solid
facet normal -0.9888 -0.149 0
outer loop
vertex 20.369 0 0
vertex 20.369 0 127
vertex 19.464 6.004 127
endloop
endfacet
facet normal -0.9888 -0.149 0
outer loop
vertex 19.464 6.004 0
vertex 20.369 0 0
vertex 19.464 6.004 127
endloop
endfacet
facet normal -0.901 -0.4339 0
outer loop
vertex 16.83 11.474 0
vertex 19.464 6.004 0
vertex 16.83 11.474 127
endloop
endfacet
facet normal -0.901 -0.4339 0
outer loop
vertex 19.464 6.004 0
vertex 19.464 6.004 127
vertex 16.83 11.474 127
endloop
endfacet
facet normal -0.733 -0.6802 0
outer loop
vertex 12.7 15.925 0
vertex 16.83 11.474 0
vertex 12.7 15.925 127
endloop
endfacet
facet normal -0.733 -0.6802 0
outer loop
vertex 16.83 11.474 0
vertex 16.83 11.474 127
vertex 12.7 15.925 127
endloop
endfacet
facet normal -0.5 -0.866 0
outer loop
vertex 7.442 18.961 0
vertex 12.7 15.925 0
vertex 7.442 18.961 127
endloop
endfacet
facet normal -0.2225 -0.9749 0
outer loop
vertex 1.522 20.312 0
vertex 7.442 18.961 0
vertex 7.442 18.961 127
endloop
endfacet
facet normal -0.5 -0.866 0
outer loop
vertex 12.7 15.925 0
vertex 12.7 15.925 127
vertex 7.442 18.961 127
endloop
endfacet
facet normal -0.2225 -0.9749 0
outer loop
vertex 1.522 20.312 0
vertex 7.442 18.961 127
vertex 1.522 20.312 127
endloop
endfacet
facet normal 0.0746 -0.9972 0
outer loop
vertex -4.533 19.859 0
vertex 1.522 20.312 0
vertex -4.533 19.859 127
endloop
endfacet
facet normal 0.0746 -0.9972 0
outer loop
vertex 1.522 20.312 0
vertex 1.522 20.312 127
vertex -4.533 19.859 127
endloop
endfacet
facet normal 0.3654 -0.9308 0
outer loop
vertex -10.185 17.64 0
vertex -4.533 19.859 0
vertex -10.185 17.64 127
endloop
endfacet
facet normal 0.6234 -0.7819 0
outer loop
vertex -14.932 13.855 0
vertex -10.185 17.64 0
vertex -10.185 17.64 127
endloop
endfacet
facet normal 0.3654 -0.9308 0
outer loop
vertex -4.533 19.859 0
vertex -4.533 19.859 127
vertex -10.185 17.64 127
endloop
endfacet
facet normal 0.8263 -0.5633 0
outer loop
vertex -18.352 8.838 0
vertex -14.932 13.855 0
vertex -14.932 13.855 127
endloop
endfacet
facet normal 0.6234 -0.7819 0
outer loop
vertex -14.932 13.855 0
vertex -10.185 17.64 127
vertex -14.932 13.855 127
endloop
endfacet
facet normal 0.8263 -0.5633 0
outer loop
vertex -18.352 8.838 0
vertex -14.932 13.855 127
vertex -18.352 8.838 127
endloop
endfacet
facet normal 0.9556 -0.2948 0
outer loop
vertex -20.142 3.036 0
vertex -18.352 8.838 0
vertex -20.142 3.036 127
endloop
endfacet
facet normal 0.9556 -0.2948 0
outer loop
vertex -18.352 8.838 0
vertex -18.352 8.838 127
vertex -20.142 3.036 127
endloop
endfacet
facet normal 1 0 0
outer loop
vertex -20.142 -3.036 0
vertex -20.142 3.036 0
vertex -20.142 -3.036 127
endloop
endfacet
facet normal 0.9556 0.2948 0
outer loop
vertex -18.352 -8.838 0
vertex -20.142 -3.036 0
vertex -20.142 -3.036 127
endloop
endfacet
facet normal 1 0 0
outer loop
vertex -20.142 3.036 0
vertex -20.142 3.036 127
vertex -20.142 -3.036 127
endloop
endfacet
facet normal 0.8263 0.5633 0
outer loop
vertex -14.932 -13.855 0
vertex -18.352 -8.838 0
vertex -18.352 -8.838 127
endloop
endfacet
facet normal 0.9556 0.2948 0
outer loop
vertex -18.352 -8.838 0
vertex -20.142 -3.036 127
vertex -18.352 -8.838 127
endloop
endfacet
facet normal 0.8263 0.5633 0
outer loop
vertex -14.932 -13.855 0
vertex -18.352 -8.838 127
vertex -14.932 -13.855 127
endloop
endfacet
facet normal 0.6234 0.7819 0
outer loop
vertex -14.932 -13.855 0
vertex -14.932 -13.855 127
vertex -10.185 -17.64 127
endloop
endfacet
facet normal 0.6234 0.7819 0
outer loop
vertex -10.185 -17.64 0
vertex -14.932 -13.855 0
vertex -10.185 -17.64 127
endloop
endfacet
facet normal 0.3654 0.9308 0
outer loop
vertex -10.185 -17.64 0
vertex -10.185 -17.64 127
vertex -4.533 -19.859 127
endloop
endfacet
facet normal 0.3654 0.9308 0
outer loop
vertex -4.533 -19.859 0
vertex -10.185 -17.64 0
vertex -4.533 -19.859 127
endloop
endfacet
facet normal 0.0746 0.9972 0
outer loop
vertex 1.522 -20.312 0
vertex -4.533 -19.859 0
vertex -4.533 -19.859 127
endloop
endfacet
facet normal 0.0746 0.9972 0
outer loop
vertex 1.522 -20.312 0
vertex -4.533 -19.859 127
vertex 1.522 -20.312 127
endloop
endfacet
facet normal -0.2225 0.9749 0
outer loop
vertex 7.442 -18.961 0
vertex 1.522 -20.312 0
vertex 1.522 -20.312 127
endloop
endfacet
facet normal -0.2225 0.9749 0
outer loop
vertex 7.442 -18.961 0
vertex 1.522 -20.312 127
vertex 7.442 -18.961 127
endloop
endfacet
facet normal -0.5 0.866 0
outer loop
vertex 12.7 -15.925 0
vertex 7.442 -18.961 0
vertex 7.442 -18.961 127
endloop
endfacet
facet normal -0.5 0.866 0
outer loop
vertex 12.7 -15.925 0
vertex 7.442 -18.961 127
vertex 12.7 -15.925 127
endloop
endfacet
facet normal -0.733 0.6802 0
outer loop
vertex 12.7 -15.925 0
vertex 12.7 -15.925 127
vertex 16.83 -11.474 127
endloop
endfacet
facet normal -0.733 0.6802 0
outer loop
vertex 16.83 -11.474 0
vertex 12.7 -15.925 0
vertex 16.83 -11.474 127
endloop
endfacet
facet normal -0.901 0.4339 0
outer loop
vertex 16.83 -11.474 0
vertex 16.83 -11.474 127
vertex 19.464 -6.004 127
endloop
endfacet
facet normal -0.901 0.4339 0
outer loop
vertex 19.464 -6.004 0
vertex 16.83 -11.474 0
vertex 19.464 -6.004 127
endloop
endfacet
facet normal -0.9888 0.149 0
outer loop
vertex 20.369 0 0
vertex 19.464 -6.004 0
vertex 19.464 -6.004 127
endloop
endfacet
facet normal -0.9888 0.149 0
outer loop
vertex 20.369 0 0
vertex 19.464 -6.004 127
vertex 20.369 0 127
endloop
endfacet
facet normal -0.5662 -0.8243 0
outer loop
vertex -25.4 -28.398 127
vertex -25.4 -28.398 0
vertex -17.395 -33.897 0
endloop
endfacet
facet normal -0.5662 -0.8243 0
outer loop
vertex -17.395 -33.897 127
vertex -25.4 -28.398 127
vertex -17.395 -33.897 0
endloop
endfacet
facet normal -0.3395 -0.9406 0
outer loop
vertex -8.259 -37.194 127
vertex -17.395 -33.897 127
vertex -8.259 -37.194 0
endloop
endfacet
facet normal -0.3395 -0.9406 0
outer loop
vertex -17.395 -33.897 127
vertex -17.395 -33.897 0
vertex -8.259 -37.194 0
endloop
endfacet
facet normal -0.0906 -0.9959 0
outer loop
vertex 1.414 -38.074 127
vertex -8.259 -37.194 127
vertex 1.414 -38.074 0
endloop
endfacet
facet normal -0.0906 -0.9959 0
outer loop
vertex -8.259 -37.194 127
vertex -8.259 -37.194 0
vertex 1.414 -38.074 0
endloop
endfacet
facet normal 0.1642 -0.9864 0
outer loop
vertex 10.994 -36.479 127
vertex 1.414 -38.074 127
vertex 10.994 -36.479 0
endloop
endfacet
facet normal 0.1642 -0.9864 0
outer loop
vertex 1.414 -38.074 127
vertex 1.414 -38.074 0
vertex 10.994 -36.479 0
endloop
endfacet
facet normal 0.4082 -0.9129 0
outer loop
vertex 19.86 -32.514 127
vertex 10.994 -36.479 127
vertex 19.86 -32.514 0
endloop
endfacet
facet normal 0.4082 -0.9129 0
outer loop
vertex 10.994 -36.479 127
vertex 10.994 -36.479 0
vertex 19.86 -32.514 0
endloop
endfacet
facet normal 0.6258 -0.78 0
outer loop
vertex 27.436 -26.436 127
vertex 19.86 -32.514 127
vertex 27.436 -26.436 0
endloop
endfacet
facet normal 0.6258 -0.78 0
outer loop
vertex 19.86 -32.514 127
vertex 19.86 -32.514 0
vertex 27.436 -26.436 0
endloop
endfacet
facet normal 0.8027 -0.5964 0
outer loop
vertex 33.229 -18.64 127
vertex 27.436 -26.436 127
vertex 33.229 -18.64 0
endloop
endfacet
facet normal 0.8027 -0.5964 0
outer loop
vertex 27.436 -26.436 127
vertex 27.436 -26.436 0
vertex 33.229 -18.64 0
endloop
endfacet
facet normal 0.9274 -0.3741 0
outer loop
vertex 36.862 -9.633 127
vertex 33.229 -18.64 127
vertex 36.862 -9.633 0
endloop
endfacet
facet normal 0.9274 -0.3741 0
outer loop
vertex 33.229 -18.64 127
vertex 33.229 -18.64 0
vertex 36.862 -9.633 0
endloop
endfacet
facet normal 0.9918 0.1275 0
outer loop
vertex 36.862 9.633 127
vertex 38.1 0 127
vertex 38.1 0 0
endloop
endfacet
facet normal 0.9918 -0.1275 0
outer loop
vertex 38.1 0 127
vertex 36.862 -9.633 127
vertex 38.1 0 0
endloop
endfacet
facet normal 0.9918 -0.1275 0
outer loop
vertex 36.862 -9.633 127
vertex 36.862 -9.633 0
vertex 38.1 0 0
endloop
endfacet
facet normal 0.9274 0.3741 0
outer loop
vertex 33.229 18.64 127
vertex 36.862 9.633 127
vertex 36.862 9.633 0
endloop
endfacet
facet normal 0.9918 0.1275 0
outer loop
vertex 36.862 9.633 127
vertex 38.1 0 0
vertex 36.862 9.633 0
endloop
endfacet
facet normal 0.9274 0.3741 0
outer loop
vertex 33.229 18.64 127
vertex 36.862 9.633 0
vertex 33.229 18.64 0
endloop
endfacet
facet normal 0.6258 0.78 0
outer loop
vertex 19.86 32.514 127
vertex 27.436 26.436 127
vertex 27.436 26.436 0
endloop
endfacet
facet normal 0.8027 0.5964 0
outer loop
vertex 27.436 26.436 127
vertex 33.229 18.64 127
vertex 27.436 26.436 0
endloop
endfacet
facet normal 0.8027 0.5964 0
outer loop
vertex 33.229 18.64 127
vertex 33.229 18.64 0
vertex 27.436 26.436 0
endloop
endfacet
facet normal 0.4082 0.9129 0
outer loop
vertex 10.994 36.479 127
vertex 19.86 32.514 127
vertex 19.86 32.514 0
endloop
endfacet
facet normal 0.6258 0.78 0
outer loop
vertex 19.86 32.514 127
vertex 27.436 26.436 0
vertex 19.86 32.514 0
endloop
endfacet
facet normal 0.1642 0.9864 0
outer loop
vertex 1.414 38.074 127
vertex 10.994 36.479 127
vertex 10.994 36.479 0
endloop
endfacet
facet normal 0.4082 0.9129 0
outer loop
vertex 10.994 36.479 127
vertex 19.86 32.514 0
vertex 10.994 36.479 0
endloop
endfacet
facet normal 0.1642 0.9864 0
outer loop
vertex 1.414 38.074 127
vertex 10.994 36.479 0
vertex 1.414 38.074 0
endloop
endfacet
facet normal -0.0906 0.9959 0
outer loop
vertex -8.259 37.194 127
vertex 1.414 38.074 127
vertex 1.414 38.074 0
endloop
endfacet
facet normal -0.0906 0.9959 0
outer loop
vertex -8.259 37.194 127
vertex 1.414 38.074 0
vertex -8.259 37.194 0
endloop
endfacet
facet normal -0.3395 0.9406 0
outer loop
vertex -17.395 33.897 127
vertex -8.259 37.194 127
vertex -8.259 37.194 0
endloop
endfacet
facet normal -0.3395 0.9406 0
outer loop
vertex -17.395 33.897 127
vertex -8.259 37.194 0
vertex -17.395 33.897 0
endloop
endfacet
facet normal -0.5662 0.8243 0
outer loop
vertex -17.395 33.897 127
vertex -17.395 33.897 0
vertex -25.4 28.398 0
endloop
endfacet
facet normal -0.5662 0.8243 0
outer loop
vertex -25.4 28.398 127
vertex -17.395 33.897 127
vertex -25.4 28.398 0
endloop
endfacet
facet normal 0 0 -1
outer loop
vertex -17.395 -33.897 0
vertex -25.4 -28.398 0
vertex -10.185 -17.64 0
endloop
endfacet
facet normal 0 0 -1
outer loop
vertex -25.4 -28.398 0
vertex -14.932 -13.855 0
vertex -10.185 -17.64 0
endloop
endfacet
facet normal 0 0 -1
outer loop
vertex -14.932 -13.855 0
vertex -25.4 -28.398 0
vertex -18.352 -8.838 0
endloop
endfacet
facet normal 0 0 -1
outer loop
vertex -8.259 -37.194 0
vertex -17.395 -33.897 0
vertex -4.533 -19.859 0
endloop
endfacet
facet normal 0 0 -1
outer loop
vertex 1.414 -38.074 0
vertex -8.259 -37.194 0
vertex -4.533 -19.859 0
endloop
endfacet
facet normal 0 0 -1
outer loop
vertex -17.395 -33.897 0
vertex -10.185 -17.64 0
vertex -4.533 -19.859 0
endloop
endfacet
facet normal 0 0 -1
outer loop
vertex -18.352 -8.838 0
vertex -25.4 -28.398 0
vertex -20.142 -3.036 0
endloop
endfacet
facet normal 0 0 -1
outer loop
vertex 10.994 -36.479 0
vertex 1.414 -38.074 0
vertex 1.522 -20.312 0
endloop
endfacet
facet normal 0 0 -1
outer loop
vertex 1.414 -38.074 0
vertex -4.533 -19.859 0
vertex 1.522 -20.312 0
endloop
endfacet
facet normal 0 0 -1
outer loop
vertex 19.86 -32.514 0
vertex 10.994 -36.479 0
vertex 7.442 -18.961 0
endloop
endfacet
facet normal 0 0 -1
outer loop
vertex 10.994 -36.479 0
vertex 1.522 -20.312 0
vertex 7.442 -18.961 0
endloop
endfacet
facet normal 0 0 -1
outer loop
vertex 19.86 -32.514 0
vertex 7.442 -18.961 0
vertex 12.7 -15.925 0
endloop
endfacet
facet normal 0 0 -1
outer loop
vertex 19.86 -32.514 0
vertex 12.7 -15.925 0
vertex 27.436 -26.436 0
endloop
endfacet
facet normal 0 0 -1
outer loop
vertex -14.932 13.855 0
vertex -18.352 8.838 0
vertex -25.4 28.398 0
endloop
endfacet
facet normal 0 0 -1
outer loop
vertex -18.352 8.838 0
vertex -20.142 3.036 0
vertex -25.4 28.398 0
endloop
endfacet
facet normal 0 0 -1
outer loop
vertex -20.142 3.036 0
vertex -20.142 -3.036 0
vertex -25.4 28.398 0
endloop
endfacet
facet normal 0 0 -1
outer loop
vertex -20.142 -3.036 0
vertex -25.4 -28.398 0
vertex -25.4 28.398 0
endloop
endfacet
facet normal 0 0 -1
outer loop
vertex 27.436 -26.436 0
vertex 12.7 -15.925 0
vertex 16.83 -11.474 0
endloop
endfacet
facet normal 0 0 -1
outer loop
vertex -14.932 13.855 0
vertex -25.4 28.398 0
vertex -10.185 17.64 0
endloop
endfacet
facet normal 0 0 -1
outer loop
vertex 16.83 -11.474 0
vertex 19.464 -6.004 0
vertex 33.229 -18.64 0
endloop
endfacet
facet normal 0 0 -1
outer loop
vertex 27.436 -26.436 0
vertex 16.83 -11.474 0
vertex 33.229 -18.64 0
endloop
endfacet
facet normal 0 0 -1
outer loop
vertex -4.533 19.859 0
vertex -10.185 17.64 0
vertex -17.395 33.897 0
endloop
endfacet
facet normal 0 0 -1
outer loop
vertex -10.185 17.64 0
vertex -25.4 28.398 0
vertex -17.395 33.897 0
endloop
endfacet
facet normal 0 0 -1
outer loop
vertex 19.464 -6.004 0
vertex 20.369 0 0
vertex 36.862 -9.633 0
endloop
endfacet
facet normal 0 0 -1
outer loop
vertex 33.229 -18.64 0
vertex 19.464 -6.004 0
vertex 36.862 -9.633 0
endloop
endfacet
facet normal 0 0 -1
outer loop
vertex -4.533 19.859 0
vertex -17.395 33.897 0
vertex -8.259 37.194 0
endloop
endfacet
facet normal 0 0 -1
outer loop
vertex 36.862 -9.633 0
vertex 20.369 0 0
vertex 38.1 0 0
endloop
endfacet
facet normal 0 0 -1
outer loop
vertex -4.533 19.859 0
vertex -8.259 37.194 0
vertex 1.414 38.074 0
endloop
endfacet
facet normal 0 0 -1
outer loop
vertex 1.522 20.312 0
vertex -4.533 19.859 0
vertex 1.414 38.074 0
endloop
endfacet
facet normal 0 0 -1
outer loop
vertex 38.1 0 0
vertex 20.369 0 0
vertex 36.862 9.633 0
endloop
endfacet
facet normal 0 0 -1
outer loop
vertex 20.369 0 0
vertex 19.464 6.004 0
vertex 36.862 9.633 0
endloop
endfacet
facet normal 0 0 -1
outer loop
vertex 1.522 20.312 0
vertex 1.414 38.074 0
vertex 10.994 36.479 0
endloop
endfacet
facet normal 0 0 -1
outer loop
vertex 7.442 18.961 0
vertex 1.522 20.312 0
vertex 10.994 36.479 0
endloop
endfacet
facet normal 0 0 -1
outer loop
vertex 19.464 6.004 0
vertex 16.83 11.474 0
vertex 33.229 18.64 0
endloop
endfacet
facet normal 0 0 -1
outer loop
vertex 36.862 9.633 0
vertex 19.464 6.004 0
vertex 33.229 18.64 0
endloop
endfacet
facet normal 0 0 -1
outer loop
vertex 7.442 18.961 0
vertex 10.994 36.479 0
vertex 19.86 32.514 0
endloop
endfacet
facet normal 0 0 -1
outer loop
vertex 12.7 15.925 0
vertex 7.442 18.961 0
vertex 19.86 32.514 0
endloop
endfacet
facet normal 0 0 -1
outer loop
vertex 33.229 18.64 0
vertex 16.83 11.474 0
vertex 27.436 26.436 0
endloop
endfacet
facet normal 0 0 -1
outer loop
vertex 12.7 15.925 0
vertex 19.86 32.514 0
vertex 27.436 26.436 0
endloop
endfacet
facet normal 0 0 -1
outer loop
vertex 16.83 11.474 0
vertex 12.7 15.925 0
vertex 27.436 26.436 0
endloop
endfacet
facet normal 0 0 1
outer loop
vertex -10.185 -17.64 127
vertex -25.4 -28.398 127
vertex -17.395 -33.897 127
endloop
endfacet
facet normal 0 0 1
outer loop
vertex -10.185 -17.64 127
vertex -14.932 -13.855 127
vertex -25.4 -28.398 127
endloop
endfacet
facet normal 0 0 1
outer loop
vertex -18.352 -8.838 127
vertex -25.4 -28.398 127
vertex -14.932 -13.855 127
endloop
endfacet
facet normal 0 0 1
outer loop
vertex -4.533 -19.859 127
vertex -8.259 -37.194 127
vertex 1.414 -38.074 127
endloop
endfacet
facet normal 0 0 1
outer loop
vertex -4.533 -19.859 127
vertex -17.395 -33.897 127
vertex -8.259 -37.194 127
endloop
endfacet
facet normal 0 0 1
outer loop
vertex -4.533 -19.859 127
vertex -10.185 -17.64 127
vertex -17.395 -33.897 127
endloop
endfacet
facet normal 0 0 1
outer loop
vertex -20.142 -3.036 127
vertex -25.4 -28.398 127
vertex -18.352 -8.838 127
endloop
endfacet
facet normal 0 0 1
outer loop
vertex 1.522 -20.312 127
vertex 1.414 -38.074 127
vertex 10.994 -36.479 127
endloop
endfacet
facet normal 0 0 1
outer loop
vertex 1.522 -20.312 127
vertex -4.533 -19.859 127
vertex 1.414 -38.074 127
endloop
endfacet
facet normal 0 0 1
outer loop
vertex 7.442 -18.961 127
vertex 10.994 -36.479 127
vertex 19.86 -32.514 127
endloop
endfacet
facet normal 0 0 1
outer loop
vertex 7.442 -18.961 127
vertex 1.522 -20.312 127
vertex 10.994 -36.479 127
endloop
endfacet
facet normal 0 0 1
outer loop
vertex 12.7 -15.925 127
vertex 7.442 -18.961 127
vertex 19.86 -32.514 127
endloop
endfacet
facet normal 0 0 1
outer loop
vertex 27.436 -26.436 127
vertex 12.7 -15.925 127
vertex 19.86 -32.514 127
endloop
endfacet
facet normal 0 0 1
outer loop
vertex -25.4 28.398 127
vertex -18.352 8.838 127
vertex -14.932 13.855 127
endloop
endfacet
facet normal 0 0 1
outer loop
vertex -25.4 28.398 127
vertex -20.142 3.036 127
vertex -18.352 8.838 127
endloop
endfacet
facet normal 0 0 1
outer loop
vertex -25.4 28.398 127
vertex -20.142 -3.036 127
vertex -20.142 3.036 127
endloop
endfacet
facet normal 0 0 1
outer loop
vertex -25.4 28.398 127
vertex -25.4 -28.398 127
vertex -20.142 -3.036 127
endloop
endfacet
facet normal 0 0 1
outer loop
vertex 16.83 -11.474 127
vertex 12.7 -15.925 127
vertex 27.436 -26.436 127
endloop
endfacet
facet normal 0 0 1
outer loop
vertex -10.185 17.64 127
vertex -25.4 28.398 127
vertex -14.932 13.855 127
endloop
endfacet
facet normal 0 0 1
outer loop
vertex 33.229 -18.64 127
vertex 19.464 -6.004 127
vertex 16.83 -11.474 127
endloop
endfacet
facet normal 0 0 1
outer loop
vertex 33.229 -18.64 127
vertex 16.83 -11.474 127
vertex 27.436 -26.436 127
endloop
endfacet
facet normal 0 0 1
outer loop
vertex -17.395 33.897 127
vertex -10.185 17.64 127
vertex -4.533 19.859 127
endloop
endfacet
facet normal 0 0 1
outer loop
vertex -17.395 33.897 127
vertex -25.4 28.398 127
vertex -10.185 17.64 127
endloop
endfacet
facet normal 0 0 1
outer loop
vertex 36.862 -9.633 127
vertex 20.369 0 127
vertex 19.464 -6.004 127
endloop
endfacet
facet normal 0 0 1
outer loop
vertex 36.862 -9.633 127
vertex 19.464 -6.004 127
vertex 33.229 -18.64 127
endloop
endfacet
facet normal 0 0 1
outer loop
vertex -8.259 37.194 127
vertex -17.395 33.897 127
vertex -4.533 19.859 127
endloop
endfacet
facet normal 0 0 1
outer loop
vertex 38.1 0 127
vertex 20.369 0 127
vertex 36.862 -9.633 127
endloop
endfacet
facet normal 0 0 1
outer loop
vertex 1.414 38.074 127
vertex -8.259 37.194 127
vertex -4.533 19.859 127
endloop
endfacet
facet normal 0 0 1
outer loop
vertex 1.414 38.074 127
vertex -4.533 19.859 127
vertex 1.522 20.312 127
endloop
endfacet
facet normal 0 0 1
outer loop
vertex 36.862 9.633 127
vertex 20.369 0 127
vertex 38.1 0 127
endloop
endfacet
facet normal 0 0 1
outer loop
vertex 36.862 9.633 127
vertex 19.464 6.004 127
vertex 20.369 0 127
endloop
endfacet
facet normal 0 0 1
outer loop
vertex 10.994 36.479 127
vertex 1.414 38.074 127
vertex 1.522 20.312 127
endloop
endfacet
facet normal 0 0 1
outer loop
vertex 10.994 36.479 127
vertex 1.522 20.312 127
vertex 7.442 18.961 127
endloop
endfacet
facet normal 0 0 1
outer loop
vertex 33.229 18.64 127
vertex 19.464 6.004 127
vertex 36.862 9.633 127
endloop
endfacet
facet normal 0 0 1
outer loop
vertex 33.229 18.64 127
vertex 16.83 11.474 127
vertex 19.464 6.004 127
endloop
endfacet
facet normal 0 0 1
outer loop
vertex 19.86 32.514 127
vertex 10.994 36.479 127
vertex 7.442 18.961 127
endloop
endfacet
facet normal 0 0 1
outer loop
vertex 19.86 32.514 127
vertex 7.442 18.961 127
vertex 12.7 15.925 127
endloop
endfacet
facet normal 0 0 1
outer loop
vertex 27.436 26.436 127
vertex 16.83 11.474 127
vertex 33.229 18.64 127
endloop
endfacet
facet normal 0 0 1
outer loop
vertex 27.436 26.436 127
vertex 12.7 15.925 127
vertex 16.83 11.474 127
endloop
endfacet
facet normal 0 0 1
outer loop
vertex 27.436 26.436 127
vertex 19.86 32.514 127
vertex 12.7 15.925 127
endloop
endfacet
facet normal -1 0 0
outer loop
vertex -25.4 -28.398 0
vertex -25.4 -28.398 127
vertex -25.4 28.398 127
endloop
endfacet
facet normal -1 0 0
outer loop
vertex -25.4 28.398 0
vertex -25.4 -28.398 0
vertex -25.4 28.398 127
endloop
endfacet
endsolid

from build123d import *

# Parameters (mm, degrees)
F0_R     = 38.1
F1_DEPTH = 127
F2_R     = 20.3692597416
F3_DEPTH = 127.001
F5_DEPTH = 127.001


with BuildPart() as f1:
    # F0 (on Top) → F1 (new body)
    with BuildSketch(Plane.XY):
        Circle(F0_R)
    extrude(amount=F1_DEPTH)

    # F2 (on face) → F3 (cut, through all)
    with BuildSketch(Plane.XY.offset(127)):
        Circle(F2_R)
    extrude(amount=-F3_DEPTH, mode=Mode.SUBTRACT)

    # F4 (on face) → F5 (cut, through all)
    with BuildSketch(Plane.XY.offset(127)):
        with BuildLine():
            ThreePointArc((-25.4, 28.3980633142), (-38.1, 0), (-25.4, -28.3980633142))
            Line((-25.4, -28.3980633142), (-25.4, 28.3980633142))
        make_face()
    extrude(amount=-F5_DEPTH, mode=Mode.SUBTRACT)


solid = f1.part
